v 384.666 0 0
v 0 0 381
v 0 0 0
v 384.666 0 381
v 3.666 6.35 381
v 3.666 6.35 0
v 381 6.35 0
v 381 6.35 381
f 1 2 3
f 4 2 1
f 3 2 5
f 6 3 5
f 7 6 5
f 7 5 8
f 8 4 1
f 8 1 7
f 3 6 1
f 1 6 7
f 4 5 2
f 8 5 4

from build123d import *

# Parameters (mm, degrees)
SKETCH1_W           = 381
SKETCH1_H           = 381
BOSS_EXTRUDE1_DEPTH = 6.35
CUT_EXTRUDE1_DEPTH  = 382
BOSS_EXTRUDE2_DEPTH = 381


with BuildPart() as part:
    # Sketch1 → Boss-Extrude1 (new body)
    with BuildSketch(Plane(origin=(0, 0, 0), x_dir=(1, 0, 0), z_dir=(0, 1, 0))):
        with Locations((190.5, -190.5)):
            Rectangle(SKETCH1_W, SKETCH1_H)
    extrude(amount=BOSS_EXTRUDE1_DEPTH)

    # Sketch2 → Cut-Extrude1 (cut, through all)
    with BuildSketch(Plane.XY.offset(381)):
        Polygon((0, 0), (3.666174209, 6.35), (0, 6.35), align=None)
    extrude(amount=-CUT_EXTRUDE1_DEPTH, mode=Mode.SUBTRACT)

    # Sketch5 → Boss-Extrude2 (add)
    with BuildSketch(Plane.XY.offset(381)):
        Polygon((381, 0), (384.666174209, 0), (381, 6.35), align=None)
    extrude(amount=-BOSS_EXTRUDE2_DEPTH)


solid = part.part
